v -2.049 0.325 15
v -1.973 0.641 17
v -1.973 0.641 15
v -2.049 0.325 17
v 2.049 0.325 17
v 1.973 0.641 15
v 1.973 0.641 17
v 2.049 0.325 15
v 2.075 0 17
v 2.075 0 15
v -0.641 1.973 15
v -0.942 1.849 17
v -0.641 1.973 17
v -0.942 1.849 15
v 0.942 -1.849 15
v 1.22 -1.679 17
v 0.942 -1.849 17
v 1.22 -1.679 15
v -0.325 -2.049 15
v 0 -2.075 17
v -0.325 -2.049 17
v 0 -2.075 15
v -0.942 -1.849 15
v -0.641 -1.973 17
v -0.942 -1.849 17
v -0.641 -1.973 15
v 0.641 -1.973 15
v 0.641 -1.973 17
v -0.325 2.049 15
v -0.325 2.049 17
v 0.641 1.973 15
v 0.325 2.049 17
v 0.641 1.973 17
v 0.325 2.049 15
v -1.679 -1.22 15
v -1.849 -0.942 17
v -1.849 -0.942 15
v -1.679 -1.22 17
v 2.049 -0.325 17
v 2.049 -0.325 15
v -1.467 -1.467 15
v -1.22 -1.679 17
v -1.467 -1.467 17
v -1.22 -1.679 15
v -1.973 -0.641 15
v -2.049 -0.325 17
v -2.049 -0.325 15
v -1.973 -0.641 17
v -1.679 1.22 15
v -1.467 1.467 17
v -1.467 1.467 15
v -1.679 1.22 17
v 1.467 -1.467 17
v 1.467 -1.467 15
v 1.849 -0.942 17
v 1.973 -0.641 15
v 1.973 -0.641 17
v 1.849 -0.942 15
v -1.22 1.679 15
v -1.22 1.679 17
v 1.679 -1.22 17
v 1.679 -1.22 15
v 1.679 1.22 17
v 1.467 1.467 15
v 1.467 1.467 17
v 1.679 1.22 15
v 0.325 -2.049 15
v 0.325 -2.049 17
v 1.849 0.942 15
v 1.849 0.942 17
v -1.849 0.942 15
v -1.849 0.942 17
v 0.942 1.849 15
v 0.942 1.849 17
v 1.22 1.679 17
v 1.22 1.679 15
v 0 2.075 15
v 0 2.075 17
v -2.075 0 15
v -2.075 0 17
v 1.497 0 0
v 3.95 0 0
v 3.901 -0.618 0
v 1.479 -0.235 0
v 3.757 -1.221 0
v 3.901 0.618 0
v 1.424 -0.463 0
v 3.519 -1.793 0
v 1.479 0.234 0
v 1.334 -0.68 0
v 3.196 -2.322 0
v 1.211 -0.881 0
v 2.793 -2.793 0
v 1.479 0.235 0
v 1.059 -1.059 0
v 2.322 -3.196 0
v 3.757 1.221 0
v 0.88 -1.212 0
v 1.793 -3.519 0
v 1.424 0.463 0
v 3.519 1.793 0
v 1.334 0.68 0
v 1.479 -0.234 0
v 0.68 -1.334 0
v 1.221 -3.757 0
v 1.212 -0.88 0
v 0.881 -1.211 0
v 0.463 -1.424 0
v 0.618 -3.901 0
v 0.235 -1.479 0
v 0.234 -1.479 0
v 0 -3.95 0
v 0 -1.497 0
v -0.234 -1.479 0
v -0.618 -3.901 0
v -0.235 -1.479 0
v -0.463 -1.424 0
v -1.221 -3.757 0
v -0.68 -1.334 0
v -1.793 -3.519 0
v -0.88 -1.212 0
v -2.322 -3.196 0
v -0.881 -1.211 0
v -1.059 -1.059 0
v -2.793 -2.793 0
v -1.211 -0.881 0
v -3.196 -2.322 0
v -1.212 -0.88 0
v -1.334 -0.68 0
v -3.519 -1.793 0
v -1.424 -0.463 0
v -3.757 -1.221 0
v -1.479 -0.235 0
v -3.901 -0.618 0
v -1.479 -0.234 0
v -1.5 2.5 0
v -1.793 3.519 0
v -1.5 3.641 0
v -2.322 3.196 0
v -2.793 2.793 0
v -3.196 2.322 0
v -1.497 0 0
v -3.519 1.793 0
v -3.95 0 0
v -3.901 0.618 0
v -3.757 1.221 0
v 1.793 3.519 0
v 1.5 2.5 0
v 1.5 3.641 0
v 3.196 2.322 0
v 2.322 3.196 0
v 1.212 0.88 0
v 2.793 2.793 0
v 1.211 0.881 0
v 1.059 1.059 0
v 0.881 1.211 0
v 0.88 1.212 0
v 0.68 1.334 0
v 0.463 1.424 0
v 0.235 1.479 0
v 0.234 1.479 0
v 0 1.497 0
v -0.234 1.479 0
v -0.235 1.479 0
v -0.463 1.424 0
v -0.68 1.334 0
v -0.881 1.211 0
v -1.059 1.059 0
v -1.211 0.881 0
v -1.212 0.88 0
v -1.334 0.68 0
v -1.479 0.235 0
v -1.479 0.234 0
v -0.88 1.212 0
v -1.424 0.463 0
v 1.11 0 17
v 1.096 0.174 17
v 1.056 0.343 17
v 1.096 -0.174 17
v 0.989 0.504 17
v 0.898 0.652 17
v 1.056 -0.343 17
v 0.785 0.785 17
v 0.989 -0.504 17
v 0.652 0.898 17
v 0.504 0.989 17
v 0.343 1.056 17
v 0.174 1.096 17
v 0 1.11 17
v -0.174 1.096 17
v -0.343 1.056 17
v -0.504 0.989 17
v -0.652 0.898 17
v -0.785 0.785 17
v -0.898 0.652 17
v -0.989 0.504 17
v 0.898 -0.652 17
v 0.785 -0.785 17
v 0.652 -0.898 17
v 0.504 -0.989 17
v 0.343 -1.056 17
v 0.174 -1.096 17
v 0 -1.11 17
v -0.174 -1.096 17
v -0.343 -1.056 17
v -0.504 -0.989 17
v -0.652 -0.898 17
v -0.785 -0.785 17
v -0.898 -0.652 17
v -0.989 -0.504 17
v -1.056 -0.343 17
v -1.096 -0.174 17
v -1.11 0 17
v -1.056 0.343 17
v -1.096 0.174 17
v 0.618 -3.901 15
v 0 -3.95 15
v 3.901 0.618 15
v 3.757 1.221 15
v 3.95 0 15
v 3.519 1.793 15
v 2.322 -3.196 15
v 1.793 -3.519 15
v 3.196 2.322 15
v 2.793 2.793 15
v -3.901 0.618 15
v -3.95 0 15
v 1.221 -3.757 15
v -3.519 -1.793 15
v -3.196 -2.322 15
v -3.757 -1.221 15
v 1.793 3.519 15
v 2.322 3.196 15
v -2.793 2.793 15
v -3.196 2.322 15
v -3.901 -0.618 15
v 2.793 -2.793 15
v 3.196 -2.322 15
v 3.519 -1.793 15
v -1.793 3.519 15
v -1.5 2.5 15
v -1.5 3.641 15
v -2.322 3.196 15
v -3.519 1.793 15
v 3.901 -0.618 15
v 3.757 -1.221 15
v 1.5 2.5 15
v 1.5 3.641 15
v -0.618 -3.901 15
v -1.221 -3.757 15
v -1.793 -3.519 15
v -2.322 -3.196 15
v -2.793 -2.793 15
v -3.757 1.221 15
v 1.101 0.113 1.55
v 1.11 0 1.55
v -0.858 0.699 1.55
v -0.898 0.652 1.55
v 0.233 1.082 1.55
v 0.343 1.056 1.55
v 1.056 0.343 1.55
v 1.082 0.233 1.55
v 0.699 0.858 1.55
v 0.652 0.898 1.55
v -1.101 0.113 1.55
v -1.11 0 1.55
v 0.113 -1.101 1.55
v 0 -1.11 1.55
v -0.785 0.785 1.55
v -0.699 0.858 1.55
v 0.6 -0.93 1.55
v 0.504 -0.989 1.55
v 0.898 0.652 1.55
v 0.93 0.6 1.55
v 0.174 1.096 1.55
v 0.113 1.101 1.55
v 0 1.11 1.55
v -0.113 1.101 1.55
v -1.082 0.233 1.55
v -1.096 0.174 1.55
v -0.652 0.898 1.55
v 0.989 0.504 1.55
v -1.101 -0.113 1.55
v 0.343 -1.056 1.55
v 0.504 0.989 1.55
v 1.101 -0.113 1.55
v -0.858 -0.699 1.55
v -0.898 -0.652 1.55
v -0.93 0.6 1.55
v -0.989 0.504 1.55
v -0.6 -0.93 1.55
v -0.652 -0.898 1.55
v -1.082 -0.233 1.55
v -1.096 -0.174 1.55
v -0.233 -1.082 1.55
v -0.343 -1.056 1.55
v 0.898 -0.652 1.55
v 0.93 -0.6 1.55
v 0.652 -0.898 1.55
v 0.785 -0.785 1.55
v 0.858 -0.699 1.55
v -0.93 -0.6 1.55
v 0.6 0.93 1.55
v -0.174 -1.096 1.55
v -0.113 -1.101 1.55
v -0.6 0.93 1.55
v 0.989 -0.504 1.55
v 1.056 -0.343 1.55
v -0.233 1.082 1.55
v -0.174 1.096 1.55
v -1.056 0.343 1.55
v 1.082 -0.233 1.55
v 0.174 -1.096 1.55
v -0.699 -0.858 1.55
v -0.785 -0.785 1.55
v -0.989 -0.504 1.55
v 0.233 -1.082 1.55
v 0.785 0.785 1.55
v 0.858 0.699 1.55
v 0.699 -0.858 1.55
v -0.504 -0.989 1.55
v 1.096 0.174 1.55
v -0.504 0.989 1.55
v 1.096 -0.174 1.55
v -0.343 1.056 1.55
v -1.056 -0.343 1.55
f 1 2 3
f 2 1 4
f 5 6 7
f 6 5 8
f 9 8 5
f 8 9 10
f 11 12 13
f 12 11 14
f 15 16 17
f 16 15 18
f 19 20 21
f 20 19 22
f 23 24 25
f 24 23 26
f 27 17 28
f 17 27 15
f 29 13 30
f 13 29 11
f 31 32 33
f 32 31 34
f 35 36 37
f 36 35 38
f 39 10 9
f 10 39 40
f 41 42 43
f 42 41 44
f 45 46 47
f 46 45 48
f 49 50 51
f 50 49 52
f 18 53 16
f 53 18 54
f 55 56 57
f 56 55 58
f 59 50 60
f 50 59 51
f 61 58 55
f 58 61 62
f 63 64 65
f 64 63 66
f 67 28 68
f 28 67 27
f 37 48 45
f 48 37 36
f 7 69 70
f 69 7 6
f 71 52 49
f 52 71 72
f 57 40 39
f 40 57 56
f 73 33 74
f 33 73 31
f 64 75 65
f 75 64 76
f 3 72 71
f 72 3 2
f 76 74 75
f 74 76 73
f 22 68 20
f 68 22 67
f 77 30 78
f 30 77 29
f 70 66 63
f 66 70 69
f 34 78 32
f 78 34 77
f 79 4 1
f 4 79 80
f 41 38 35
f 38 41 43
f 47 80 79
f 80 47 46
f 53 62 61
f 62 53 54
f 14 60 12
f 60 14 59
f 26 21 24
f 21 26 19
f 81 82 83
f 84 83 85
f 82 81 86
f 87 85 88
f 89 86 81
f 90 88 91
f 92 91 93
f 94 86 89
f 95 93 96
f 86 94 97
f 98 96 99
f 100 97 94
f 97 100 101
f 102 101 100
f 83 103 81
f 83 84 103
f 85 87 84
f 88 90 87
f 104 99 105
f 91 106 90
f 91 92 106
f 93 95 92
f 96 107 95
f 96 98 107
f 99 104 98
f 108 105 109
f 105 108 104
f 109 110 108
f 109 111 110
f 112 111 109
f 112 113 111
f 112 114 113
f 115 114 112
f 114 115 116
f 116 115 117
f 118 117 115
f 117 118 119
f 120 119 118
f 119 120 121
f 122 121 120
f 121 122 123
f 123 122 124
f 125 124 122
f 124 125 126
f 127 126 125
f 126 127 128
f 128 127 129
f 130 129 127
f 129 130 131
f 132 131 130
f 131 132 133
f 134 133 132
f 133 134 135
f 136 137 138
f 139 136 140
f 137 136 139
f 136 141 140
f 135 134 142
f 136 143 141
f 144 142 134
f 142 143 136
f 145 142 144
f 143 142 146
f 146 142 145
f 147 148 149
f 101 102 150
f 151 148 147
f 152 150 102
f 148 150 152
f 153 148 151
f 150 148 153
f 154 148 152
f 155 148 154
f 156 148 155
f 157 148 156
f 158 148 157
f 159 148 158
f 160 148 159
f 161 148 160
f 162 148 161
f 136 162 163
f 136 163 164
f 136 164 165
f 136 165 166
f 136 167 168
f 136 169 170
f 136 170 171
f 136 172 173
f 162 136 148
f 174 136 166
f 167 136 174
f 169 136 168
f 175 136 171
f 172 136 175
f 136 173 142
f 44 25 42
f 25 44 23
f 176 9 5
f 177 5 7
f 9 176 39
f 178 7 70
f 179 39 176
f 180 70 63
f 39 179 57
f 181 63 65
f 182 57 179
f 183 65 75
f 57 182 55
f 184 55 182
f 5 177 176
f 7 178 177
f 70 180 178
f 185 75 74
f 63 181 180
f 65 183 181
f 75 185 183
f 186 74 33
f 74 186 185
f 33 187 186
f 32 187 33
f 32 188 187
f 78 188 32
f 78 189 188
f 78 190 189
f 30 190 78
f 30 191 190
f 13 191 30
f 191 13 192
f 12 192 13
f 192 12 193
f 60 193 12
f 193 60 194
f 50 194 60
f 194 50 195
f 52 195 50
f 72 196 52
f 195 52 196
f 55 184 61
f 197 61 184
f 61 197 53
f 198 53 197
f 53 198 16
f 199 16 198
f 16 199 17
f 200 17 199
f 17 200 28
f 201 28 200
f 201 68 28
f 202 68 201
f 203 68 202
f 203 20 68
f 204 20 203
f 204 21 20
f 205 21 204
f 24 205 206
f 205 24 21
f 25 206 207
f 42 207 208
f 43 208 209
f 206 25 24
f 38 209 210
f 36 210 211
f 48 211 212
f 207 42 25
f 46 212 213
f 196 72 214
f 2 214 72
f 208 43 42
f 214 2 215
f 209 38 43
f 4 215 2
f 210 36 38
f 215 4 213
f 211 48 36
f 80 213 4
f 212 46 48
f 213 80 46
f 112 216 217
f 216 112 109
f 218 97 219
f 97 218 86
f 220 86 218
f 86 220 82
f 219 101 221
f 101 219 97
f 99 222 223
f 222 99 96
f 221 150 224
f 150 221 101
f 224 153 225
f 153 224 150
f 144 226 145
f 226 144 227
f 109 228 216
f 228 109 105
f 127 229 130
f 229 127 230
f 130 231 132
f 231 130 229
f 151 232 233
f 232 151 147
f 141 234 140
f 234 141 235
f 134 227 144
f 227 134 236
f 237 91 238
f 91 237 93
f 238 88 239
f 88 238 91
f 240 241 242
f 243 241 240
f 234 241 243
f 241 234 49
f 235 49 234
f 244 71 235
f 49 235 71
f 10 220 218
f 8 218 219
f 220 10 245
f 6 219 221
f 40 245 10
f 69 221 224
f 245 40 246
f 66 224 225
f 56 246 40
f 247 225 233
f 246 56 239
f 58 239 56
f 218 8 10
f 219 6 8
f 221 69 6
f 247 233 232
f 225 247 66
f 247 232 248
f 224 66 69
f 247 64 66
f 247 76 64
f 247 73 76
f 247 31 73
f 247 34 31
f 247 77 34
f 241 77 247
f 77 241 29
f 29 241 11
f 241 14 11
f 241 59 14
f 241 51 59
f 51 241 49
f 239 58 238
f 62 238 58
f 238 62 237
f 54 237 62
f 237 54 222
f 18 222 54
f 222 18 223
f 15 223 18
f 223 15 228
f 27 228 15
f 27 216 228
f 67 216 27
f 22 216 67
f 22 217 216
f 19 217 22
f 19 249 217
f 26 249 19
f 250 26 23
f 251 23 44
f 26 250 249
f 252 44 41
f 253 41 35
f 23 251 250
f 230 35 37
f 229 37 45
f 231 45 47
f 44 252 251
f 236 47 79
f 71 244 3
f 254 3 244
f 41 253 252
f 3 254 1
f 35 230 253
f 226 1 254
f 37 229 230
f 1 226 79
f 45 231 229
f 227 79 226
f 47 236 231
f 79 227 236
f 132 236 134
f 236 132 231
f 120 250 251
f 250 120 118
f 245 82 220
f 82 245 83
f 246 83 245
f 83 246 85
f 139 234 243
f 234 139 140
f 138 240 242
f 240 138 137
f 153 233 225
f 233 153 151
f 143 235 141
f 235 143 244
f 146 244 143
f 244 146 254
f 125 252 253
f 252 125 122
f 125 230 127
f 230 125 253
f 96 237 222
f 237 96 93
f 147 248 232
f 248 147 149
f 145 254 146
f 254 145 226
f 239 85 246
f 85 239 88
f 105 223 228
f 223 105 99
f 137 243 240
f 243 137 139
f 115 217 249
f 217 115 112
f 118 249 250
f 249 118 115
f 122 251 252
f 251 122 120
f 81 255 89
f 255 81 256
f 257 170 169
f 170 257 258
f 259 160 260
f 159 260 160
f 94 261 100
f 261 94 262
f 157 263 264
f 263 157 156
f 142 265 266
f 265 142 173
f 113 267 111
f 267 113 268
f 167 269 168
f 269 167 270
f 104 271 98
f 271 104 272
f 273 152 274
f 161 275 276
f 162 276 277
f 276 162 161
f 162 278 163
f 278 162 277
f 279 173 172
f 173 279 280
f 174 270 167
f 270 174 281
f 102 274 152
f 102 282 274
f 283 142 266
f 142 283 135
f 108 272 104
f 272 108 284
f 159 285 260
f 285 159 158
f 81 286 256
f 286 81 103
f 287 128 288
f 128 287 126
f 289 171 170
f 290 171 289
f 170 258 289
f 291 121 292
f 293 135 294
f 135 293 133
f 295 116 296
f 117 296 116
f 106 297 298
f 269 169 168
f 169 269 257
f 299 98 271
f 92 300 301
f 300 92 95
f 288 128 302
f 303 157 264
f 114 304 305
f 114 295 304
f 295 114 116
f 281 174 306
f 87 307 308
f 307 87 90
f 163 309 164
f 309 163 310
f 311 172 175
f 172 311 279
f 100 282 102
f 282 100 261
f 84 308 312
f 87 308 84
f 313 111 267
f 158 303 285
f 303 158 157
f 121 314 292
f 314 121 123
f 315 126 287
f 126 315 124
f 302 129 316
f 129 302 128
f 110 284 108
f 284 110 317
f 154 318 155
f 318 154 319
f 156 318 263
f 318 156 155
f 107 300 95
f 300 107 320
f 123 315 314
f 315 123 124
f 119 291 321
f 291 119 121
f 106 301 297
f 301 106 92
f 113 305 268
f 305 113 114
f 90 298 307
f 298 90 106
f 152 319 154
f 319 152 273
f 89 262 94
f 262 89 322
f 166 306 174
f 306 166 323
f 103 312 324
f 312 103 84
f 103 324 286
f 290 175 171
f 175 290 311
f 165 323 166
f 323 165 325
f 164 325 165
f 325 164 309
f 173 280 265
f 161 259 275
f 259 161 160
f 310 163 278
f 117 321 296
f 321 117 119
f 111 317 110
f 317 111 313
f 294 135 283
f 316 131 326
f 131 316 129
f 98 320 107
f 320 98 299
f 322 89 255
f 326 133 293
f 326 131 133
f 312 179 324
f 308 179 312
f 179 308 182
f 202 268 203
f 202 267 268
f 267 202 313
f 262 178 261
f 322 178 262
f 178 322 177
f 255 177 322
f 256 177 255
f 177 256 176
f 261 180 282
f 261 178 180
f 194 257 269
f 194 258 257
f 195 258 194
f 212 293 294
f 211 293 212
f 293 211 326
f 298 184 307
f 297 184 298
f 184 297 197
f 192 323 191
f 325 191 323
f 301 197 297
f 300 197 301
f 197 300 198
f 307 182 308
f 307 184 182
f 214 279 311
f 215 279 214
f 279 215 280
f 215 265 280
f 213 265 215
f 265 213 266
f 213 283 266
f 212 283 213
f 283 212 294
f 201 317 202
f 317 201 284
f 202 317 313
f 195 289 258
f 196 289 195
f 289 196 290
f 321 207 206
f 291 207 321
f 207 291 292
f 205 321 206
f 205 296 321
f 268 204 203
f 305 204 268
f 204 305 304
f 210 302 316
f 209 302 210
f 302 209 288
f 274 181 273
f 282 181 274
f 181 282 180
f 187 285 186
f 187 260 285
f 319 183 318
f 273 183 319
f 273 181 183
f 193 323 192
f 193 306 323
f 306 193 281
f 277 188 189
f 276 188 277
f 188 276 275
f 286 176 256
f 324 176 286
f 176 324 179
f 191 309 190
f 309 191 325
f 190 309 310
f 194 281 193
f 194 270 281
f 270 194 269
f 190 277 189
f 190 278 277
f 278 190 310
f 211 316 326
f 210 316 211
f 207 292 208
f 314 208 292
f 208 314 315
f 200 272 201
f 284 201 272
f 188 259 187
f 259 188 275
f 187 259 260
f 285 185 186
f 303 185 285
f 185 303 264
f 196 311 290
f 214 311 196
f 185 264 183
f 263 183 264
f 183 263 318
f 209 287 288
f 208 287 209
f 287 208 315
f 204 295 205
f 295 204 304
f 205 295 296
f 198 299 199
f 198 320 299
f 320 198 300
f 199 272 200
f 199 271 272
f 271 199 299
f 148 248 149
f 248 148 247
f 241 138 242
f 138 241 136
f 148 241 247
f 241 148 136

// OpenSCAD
difference()
{
  union()
  {
    cylinder(h=17, d=4.15, $fn=40);
    cylinder(h=15, d=7.9, $fn=40);
  }
  translate([0,0,-0.01])
    union()
    {
      cylinder(h=3, d2=1.5, d1 = 3.0, $fn=40);
      cylinder(h=20, d=2.22, $fn=40);
  translate([0,4,7.5]) color("blue")cube([3,3,16], center = true);
    }
}
